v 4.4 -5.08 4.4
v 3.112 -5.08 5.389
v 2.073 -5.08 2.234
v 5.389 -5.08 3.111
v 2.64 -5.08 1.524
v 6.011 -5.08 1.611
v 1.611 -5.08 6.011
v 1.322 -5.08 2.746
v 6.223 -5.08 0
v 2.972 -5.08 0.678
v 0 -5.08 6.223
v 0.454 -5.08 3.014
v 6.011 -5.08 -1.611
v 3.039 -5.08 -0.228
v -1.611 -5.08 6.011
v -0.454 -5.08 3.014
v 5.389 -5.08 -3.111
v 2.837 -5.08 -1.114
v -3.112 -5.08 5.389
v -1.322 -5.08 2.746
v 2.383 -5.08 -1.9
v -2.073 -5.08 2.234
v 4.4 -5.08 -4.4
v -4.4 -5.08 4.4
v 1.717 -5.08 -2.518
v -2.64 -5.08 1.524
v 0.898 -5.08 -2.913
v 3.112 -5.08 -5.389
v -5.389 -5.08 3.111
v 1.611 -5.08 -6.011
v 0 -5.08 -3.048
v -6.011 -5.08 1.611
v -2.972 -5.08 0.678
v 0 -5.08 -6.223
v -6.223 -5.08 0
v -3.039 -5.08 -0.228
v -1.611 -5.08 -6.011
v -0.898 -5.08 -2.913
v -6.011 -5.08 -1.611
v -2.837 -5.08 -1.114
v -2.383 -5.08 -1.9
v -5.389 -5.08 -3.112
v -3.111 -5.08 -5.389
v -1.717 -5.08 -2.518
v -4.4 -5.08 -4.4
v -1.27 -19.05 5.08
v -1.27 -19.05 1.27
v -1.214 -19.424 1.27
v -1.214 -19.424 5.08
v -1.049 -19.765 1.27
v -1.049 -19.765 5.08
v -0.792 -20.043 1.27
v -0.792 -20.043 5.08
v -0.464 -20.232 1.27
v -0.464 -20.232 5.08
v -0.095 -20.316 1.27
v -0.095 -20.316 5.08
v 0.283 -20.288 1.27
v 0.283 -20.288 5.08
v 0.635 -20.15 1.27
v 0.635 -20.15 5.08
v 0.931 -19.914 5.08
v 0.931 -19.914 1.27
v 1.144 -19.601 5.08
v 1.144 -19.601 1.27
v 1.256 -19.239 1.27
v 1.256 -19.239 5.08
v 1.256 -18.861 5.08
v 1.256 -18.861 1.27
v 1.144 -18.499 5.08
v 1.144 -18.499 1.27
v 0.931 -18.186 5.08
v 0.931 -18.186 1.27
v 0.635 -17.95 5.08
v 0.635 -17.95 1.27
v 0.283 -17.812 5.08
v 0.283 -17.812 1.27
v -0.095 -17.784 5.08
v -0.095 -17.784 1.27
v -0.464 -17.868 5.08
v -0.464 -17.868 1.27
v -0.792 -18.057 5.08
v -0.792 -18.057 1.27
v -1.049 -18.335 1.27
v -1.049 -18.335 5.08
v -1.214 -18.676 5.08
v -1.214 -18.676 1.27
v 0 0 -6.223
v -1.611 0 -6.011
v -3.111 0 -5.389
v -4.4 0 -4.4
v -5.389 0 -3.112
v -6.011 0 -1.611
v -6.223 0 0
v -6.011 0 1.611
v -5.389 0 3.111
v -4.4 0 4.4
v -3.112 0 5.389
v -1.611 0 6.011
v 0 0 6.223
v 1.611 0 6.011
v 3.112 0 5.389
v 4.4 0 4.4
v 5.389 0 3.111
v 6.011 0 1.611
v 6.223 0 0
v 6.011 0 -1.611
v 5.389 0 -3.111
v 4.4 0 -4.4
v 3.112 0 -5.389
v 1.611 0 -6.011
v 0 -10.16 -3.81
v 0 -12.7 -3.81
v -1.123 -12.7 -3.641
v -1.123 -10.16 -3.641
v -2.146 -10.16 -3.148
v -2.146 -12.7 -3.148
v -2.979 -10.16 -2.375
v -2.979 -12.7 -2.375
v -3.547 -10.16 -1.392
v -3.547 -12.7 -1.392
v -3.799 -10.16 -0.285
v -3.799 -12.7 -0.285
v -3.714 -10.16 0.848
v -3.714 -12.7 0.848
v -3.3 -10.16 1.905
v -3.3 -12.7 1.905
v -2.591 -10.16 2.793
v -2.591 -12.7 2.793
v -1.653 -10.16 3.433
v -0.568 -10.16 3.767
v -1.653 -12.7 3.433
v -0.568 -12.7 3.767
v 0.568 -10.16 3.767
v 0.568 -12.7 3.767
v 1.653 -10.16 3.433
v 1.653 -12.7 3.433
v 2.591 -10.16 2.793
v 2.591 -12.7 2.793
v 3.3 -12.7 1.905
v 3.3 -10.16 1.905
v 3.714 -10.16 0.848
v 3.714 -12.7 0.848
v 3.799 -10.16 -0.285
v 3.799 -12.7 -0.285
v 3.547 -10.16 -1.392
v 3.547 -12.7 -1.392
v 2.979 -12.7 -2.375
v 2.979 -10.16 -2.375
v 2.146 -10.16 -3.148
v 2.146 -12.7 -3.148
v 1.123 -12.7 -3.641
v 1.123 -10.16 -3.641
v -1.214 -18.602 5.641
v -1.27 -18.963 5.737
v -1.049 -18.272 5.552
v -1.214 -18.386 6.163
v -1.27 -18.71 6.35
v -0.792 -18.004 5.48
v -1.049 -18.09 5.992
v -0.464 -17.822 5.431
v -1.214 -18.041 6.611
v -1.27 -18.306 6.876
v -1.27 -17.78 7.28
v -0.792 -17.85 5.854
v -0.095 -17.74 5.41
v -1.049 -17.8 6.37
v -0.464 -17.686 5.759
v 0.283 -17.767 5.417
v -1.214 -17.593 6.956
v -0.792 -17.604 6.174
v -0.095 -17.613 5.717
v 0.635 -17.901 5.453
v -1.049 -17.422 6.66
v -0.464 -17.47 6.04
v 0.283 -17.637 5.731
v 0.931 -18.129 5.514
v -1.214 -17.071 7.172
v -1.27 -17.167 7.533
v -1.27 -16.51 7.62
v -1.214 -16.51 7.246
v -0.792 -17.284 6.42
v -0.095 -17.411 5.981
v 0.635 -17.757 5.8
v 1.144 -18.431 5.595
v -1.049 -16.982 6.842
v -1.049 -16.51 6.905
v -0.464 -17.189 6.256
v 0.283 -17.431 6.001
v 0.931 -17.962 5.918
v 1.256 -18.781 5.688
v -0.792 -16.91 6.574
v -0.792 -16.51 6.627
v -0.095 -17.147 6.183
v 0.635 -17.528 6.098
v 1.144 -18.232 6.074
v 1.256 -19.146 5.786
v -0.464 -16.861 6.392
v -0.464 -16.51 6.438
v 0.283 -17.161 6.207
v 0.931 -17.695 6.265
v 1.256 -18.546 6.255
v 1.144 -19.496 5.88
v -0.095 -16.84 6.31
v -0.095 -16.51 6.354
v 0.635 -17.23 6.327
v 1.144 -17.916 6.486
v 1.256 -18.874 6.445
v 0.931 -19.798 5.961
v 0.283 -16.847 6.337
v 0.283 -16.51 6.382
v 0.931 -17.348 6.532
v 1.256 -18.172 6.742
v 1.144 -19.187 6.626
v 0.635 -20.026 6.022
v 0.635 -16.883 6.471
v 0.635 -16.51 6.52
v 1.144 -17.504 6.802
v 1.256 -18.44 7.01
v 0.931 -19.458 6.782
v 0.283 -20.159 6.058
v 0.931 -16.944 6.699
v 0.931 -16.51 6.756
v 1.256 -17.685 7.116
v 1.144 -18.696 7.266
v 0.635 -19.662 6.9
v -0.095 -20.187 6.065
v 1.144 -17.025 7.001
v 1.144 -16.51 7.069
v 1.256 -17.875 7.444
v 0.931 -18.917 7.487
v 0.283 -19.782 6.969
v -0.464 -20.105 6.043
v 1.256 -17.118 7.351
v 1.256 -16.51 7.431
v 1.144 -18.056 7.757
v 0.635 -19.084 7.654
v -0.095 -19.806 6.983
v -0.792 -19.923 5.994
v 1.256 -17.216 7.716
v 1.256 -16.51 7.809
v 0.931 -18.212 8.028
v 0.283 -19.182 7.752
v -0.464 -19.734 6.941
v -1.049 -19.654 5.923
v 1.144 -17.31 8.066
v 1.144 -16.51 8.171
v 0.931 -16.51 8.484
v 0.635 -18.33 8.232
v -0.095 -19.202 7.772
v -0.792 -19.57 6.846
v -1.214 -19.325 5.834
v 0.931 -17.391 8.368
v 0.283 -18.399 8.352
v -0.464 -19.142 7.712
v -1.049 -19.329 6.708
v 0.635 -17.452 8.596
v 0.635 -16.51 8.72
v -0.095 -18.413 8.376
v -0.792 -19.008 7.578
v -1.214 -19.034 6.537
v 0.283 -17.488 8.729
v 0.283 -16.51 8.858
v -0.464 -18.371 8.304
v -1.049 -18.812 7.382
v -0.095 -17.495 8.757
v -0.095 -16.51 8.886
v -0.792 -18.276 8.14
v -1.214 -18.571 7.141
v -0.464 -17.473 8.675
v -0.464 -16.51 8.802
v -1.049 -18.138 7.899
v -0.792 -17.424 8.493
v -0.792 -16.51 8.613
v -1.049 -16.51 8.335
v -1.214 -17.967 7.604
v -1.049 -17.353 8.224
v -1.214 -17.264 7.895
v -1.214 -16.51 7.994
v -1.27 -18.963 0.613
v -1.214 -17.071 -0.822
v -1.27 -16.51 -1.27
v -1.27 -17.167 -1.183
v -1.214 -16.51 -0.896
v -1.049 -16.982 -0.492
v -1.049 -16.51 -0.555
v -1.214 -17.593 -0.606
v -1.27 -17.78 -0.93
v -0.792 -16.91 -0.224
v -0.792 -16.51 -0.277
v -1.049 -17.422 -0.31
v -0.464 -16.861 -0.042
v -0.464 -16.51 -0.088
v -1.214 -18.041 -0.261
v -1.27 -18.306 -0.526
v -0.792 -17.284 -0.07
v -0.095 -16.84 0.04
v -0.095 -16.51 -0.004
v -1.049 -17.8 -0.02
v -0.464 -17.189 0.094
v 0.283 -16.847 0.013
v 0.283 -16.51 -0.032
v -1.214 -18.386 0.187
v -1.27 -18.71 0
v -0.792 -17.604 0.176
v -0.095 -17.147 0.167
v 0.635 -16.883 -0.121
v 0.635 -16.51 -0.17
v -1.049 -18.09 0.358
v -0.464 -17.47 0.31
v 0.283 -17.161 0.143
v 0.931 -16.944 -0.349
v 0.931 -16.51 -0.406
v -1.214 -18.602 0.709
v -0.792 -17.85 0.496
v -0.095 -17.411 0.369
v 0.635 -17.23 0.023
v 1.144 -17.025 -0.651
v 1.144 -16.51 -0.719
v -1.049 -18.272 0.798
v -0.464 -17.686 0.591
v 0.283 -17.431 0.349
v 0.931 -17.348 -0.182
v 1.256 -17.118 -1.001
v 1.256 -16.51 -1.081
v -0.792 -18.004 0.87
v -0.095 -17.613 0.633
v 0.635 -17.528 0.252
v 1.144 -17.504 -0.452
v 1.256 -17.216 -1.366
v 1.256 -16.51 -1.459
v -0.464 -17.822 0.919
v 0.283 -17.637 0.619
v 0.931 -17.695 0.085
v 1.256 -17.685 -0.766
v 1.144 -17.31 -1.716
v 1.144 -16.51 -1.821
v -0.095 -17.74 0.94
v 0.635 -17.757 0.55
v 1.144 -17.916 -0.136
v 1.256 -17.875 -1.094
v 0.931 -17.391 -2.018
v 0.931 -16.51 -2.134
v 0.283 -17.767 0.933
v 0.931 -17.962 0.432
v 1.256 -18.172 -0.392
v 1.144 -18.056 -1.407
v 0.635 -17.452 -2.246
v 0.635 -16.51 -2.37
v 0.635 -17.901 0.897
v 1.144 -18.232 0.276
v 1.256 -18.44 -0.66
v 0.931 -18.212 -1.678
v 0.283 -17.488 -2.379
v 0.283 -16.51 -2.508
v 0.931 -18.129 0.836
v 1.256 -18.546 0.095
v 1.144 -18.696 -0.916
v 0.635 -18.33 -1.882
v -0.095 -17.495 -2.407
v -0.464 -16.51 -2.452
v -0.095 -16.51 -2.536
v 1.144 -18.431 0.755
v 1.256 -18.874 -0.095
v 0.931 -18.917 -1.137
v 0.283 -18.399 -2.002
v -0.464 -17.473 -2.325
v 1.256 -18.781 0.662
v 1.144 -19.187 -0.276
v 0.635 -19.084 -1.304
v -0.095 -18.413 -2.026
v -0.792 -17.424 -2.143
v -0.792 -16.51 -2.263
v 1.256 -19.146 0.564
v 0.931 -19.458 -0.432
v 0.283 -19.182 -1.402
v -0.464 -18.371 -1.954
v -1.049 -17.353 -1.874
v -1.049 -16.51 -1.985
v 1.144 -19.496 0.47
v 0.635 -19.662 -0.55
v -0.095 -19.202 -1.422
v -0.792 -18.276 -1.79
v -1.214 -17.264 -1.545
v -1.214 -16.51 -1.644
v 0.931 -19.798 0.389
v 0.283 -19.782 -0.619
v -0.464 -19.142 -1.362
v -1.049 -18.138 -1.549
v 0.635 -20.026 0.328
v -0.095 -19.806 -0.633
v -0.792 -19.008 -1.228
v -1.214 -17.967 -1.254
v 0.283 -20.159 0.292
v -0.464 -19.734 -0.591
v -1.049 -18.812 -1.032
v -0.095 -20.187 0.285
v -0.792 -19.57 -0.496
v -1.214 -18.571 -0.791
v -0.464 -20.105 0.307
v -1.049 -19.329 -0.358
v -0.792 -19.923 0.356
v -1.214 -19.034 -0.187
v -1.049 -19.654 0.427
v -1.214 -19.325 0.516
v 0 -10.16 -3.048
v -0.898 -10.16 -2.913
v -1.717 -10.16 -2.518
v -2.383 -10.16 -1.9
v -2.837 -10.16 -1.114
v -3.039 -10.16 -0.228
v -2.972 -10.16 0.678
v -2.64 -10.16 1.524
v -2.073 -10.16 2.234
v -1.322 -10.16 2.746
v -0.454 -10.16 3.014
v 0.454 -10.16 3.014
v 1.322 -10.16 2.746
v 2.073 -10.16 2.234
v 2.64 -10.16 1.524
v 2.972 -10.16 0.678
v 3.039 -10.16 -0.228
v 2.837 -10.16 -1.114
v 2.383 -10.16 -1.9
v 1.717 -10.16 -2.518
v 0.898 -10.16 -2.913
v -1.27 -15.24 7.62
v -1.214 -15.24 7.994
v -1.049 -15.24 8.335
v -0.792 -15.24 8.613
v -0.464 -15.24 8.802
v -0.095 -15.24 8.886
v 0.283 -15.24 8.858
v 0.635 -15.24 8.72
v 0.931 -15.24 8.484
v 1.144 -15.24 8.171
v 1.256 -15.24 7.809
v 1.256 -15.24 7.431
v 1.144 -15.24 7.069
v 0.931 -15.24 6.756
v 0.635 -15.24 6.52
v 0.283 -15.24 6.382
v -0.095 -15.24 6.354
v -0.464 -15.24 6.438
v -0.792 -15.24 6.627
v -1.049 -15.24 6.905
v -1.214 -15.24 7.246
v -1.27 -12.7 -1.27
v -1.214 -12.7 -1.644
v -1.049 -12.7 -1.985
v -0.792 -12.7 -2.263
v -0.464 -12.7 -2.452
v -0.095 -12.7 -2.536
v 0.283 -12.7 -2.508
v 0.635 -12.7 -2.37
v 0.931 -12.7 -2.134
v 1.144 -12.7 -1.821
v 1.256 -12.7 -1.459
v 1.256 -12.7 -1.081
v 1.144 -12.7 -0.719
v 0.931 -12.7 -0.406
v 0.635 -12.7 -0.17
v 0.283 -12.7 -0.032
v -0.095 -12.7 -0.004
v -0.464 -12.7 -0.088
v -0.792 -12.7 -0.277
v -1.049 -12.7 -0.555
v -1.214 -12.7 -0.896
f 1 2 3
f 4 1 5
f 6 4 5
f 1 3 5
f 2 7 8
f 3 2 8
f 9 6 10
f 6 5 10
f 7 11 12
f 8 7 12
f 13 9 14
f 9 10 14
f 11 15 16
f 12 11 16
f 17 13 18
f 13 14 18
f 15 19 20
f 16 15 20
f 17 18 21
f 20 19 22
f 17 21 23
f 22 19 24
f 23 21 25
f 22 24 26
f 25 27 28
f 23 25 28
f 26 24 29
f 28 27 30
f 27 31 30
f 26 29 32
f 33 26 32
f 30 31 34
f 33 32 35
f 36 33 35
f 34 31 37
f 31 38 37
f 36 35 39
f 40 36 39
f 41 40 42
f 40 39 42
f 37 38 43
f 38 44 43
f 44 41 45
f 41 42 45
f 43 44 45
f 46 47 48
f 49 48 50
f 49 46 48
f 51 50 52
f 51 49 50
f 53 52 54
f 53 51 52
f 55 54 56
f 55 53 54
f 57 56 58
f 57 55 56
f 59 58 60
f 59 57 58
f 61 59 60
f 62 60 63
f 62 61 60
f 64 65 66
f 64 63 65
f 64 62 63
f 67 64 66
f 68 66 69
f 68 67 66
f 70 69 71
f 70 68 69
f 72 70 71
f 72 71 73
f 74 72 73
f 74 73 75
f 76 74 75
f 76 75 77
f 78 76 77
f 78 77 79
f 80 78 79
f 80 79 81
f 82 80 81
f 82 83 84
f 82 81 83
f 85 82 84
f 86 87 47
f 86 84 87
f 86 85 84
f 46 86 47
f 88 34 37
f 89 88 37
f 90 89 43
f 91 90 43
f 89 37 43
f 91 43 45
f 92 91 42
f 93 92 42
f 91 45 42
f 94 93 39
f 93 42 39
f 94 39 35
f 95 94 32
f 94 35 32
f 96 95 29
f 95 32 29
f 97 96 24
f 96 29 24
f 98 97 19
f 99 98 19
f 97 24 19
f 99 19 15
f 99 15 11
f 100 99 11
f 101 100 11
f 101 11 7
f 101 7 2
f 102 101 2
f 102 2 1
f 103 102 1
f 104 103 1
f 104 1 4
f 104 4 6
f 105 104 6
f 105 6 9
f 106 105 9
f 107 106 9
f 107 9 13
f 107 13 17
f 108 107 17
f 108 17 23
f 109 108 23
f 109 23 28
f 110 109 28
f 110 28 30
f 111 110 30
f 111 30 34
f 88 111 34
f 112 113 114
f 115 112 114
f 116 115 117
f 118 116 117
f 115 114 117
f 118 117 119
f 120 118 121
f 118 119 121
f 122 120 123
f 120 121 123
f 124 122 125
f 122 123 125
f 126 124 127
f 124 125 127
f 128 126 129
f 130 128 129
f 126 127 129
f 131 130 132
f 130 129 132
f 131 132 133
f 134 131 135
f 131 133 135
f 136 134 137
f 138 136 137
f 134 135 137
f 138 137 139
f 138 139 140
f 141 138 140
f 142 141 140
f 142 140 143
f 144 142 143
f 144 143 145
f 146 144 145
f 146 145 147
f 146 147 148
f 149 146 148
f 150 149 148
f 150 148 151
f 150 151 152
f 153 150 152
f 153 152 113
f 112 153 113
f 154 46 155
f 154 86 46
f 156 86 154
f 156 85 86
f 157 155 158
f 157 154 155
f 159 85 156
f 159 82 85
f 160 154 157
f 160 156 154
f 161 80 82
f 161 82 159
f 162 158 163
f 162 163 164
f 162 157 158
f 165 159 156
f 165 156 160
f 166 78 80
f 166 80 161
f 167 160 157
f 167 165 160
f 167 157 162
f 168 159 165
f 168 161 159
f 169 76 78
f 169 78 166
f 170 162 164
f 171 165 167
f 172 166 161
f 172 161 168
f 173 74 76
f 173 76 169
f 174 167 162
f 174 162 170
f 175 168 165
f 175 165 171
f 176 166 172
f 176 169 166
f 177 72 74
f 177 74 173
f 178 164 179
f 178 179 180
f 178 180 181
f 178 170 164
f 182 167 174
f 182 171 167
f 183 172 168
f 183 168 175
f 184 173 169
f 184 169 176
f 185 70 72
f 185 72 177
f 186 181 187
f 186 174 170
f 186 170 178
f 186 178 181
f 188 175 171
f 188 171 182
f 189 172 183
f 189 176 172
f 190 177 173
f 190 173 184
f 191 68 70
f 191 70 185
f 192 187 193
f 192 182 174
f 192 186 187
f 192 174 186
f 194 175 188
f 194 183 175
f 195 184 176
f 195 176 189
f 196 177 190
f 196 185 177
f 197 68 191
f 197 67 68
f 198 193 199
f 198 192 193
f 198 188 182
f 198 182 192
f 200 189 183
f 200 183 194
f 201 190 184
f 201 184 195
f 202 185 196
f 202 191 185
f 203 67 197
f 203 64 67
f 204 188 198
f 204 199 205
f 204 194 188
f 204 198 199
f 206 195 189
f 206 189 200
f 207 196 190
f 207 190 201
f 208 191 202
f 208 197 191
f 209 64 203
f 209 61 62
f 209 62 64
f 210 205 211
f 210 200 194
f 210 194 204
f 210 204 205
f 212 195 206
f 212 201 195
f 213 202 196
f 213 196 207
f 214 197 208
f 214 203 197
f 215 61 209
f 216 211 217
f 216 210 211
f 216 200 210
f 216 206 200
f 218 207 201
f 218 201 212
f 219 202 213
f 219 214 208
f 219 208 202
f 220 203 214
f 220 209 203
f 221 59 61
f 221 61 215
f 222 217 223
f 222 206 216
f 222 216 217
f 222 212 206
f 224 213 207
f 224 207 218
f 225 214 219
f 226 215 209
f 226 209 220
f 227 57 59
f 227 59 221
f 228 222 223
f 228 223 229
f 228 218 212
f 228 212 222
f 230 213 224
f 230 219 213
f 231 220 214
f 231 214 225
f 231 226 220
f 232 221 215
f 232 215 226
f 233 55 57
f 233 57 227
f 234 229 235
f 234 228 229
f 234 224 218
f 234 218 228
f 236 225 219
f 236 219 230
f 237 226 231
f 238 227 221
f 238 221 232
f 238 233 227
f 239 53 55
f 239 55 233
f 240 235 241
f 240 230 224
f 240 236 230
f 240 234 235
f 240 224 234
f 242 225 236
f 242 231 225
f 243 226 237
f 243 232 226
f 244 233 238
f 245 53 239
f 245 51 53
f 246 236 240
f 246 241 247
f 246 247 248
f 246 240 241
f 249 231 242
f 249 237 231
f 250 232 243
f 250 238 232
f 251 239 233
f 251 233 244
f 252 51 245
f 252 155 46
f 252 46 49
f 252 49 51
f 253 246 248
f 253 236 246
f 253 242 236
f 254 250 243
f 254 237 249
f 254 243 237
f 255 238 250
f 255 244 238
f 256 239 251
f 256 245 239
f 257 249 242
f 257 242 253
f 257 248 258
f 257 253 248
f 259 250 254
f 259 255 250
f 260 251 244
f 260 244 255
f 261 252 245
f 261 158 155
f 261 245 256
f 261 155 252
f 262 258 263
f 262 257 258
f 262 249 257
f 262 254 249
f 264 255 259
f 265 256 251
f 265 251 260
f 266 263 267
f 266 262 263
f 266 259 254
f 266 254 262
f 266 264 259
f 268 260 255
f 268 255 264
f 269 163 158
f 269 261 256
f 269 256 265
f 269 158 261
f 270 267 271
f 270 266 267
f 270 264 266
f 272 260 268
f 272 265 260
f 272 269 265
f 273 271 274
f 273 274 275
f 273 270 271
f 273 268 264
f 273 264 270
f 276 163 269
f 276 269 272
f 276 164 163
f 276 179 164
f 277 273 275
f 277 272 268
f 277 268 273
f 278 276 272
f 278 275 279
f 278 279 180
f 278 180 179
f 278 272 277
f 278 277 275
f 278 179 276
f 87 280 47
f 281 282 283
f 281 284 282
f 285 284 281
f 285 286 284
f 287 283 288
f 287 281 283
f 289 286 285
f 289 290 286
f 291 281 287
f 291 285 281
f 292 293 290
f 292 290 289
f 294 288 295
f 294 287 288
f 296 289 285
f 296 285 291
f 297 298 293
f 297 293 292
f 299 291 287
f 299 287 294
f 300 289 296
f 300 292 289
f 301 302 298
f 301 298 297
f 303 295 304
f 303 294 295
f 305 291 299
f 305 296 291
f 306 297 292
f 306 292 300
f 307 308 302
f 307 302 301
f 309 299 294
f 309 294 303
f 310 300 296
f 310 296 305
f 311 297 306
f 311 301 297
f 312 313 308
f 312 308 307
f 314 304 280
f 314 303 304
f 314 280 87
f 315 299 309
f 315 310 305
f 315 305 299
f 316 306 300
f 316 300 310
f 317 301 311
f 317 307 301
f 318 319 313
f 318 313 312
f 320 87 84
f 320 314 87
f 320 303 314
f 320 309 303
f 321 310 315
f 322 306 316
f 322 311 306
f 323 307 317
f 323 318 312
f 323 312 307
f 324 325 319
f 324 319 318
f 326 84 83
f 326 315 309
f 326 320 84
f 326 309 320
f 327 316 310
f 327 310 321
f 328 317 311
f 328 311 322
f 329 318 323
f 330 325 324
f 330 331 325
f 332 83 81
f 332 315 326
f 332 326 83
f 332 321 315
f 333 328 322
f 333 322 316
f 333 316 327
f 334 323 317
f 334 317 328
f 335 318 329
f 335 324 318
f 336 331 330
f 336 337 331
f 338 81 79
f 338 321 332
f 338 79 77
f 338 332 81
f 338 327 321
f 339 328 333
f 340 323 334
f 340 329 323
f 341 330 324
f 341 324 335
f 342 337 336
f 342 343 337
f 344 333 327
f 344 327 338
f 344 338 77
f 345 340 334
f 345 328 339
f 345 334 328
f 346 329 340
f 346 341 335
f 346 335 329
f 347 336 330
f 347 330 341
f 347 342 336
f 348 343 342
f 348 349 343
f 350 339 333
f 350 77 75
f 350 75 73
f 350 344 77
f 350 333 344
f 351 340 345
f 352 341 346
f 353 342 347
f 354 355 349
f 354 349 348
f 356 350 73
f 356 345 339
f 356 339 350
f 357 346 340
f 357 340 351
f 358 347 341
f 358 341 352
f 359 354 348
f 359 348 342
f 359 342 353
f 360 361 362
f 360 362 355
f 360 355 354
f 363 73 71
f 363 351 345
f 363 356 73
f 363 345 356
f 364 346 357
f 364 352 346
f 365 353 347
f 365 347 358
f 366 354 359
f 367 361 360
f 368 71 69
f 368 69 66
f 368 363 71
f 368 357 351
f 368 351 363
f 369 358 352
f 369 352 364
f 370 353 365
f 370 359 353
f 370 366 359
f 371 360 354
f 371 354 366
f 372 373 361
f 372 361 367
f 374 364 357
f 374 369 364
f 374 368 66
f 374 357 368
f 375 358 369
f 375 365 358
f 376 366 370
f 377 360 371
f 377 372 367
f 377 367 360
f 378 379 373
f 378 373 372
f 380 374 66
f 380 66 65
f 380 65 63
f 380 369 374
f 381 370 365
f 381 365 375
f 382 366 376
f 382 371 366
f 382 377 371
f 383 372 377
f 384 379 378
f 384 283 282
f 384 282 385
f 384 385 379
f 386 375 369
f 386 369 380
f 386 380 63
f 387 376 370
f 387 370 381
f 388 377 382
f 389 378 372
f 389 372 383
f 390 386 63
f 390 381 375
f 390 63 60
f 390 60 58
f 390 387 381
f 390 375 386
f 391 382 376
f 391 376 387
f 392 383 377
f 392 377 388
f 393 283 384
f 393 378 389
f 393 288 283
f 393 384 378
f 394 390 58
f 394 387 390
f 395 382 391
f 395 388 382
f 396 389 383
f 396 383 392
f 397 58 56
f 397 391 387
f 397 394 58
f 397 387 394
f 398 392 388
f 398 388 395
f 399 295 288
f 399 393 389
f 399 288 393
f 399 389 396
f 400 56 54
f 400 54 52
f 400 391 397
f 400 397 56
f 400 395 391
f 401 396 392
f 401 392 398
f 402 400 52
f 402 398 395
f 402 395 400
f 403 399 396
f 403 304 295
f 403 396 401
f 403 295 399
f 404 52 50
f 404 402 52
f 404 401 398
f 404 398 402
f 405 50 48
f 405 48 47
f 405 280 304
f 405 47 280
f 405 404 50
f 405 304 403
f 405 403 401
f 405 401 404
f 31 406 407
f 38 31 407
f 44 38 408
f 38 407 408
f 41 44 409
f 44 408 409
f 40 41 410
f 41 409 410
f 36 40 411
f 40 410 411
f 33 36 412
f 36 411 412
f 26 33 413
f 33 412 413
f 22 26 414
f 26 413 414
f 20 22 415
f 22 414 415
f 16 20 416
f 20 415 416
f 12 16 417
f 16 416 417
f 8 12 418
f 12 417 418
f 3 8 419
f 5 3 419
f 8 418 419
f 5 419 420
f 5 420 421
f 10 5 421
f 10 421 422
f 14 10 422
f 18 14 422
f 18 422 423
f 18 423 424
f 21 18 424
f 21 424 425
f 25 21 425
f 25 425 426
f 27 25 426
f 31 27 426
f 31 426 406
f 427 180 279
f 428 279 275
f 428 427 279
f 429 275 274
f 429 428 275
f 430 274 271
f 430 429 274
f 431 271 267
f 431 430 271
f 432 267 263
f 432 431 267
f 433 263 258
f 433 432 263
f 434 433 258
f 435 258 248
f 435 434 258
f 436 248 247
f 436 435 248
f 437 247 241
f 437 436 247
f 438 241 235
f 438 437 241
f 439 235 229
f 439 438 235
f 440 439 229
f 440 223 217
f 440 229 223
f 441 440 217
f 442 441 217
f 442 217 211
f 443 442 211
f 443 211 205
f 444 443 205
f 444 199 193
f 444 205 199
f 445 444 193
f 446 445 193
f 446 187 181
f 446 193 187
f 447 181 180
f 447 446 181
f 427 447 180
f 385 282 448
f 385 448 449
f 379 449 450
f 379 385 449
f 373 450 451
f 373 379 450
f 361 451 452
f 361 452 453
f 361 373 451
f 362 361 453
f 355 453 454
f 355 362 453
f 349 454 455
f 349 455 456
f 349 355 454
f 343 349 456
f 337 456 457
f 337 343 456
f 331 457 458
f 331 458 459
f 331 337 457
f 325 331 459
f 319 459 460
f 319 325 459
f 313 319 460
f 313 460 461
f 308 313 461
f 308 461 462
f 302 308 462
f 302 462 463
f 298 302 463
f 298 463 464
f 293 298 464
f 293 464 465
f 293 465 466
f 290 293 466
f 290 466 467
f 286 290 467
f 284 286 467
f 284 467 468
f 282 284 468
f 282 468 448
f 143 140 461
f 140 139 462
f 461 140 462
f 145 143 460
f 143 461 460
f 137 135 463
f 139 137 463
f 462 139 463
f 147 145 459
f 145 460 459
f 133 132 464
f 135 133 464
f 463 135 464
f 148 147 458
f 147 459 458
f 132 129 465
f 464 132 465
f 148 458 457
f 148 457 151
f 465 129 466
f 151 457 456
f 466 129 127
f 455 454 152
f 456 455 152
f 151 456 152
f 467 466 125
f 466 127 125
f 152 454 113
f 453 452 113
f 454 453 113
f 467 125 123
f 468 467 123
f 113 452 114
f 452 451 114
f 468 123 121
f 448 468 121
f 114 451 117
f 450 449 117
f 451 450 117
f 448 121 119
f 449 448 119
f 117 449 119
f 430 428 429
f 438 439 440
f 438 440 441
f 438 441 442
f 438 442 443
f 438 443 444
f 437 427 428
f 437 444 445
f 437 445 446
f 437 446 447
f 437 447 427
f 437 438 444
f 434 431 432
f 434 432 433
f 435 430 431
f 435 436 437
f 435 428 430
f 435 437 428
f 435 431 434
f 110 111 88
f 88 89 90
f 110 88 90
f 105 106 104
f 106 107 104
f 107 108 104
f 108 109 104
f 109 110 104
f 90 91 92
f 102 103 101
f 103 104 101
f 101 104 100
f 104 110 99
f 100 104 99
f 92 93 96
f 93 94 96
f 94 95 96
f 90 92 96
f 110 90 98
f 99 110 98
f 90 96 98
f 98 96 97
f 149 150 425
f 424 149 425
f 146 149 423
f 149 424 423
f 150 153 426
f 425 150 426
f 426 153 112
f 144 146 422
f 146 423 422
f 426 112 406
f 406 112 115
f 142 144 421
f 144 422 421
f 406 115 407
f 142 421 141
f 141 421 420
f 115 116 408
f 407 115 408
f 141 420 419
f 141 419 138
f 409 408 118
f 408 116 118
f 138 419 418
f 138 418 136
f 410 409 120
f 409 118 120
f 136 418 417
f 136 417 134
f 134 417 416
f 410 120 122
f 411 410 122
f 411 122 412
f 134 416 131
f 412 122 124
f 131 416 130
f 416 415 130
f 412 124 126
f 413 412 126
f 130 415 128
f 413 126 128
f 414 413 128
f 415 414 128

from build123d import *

# Parameters (mm, degrees)
MOAR_SPRINGS_COUNT = 4
SKETCH13_R         = 1.27


with BuildPart() as part:
    # Sketch1 → button body (revolve)
    with BuildSketch(Plane.XY):
        Polygon((0, 0), (6.223, 0), (6.223, -5.08), (3.048, -5.08), (3.048, -10.16), (3.81, -10.16), (3.81, -12.7), (0, -12.7), align=None)
    revolve(axis=Axis((0, -12.7, 0), (0, 1, 0)))


with BuildPart() as moar_springs_1:
    # moar springs: pattern copy
    add(part.part.rotate(Axis((0, 0, 0), (0, -1, 0)), 1 * 360 / MOAR_SPRINGS_COUNT))


with BuildPart() as moar_springs_2:
    # moar springs: pattern copy
    add(part.part.rotate(Axis((0, 0, 0), (0, -1, 0)), 2 * 360 / MOAR_SPRINGS_COUNT))


with BuildPart() as moar_springs_3:
    # moar springs: pattern copy
    add(part.part.rotate(Axis((0, 0, 0), (0, -1, 0)), 3 * 360 / MOAR_SPRINGS_COUNT))


with BuildPart() as part_1:
    add(part.part)

    add(moar_springs_1.part)  # hook for baton merges moar springs_1

    add(moar_springs_2.part)  # hook for baton merges moar springs_2

    add(moar_springs_3.part)  # hook for baton merges moar springs_3
    # hook for baton: sweep along a path in Sketch12
    with BuildLine(Plane(origin=(0, 0, 0), x_dir=(0, 0, -1), z_dir=(1, 0, 0))) as hook_for_baton_path:
        Line((0, -12.7), (0, -16.51))
        ThreePointArc((0, -16.51), (-0.371974388, -17.408025612), (-1.27, -17.78))
        Line((-1.27, -17.78), (-5.08, -17.78))
        ThreePointArc((-5.08, -17.78), (-5.978025612, -17.408025612), (-6.35, -16.51))
        Line((-6.35, -16.51), (-6.35, -15.24))
    # Sketch13 → hook for baton (sweep)
    with BuildSketch(Plane(origin=(0, -12.7, 0), x_dir=(-1, 0, 0), z_dir=(0, -1, 0))):
        with Locations((0, 1.27)):
            Circle(SKETCH13_R)
    sweep(path=hook_for_baton_path.line)


solid = part_1.part
